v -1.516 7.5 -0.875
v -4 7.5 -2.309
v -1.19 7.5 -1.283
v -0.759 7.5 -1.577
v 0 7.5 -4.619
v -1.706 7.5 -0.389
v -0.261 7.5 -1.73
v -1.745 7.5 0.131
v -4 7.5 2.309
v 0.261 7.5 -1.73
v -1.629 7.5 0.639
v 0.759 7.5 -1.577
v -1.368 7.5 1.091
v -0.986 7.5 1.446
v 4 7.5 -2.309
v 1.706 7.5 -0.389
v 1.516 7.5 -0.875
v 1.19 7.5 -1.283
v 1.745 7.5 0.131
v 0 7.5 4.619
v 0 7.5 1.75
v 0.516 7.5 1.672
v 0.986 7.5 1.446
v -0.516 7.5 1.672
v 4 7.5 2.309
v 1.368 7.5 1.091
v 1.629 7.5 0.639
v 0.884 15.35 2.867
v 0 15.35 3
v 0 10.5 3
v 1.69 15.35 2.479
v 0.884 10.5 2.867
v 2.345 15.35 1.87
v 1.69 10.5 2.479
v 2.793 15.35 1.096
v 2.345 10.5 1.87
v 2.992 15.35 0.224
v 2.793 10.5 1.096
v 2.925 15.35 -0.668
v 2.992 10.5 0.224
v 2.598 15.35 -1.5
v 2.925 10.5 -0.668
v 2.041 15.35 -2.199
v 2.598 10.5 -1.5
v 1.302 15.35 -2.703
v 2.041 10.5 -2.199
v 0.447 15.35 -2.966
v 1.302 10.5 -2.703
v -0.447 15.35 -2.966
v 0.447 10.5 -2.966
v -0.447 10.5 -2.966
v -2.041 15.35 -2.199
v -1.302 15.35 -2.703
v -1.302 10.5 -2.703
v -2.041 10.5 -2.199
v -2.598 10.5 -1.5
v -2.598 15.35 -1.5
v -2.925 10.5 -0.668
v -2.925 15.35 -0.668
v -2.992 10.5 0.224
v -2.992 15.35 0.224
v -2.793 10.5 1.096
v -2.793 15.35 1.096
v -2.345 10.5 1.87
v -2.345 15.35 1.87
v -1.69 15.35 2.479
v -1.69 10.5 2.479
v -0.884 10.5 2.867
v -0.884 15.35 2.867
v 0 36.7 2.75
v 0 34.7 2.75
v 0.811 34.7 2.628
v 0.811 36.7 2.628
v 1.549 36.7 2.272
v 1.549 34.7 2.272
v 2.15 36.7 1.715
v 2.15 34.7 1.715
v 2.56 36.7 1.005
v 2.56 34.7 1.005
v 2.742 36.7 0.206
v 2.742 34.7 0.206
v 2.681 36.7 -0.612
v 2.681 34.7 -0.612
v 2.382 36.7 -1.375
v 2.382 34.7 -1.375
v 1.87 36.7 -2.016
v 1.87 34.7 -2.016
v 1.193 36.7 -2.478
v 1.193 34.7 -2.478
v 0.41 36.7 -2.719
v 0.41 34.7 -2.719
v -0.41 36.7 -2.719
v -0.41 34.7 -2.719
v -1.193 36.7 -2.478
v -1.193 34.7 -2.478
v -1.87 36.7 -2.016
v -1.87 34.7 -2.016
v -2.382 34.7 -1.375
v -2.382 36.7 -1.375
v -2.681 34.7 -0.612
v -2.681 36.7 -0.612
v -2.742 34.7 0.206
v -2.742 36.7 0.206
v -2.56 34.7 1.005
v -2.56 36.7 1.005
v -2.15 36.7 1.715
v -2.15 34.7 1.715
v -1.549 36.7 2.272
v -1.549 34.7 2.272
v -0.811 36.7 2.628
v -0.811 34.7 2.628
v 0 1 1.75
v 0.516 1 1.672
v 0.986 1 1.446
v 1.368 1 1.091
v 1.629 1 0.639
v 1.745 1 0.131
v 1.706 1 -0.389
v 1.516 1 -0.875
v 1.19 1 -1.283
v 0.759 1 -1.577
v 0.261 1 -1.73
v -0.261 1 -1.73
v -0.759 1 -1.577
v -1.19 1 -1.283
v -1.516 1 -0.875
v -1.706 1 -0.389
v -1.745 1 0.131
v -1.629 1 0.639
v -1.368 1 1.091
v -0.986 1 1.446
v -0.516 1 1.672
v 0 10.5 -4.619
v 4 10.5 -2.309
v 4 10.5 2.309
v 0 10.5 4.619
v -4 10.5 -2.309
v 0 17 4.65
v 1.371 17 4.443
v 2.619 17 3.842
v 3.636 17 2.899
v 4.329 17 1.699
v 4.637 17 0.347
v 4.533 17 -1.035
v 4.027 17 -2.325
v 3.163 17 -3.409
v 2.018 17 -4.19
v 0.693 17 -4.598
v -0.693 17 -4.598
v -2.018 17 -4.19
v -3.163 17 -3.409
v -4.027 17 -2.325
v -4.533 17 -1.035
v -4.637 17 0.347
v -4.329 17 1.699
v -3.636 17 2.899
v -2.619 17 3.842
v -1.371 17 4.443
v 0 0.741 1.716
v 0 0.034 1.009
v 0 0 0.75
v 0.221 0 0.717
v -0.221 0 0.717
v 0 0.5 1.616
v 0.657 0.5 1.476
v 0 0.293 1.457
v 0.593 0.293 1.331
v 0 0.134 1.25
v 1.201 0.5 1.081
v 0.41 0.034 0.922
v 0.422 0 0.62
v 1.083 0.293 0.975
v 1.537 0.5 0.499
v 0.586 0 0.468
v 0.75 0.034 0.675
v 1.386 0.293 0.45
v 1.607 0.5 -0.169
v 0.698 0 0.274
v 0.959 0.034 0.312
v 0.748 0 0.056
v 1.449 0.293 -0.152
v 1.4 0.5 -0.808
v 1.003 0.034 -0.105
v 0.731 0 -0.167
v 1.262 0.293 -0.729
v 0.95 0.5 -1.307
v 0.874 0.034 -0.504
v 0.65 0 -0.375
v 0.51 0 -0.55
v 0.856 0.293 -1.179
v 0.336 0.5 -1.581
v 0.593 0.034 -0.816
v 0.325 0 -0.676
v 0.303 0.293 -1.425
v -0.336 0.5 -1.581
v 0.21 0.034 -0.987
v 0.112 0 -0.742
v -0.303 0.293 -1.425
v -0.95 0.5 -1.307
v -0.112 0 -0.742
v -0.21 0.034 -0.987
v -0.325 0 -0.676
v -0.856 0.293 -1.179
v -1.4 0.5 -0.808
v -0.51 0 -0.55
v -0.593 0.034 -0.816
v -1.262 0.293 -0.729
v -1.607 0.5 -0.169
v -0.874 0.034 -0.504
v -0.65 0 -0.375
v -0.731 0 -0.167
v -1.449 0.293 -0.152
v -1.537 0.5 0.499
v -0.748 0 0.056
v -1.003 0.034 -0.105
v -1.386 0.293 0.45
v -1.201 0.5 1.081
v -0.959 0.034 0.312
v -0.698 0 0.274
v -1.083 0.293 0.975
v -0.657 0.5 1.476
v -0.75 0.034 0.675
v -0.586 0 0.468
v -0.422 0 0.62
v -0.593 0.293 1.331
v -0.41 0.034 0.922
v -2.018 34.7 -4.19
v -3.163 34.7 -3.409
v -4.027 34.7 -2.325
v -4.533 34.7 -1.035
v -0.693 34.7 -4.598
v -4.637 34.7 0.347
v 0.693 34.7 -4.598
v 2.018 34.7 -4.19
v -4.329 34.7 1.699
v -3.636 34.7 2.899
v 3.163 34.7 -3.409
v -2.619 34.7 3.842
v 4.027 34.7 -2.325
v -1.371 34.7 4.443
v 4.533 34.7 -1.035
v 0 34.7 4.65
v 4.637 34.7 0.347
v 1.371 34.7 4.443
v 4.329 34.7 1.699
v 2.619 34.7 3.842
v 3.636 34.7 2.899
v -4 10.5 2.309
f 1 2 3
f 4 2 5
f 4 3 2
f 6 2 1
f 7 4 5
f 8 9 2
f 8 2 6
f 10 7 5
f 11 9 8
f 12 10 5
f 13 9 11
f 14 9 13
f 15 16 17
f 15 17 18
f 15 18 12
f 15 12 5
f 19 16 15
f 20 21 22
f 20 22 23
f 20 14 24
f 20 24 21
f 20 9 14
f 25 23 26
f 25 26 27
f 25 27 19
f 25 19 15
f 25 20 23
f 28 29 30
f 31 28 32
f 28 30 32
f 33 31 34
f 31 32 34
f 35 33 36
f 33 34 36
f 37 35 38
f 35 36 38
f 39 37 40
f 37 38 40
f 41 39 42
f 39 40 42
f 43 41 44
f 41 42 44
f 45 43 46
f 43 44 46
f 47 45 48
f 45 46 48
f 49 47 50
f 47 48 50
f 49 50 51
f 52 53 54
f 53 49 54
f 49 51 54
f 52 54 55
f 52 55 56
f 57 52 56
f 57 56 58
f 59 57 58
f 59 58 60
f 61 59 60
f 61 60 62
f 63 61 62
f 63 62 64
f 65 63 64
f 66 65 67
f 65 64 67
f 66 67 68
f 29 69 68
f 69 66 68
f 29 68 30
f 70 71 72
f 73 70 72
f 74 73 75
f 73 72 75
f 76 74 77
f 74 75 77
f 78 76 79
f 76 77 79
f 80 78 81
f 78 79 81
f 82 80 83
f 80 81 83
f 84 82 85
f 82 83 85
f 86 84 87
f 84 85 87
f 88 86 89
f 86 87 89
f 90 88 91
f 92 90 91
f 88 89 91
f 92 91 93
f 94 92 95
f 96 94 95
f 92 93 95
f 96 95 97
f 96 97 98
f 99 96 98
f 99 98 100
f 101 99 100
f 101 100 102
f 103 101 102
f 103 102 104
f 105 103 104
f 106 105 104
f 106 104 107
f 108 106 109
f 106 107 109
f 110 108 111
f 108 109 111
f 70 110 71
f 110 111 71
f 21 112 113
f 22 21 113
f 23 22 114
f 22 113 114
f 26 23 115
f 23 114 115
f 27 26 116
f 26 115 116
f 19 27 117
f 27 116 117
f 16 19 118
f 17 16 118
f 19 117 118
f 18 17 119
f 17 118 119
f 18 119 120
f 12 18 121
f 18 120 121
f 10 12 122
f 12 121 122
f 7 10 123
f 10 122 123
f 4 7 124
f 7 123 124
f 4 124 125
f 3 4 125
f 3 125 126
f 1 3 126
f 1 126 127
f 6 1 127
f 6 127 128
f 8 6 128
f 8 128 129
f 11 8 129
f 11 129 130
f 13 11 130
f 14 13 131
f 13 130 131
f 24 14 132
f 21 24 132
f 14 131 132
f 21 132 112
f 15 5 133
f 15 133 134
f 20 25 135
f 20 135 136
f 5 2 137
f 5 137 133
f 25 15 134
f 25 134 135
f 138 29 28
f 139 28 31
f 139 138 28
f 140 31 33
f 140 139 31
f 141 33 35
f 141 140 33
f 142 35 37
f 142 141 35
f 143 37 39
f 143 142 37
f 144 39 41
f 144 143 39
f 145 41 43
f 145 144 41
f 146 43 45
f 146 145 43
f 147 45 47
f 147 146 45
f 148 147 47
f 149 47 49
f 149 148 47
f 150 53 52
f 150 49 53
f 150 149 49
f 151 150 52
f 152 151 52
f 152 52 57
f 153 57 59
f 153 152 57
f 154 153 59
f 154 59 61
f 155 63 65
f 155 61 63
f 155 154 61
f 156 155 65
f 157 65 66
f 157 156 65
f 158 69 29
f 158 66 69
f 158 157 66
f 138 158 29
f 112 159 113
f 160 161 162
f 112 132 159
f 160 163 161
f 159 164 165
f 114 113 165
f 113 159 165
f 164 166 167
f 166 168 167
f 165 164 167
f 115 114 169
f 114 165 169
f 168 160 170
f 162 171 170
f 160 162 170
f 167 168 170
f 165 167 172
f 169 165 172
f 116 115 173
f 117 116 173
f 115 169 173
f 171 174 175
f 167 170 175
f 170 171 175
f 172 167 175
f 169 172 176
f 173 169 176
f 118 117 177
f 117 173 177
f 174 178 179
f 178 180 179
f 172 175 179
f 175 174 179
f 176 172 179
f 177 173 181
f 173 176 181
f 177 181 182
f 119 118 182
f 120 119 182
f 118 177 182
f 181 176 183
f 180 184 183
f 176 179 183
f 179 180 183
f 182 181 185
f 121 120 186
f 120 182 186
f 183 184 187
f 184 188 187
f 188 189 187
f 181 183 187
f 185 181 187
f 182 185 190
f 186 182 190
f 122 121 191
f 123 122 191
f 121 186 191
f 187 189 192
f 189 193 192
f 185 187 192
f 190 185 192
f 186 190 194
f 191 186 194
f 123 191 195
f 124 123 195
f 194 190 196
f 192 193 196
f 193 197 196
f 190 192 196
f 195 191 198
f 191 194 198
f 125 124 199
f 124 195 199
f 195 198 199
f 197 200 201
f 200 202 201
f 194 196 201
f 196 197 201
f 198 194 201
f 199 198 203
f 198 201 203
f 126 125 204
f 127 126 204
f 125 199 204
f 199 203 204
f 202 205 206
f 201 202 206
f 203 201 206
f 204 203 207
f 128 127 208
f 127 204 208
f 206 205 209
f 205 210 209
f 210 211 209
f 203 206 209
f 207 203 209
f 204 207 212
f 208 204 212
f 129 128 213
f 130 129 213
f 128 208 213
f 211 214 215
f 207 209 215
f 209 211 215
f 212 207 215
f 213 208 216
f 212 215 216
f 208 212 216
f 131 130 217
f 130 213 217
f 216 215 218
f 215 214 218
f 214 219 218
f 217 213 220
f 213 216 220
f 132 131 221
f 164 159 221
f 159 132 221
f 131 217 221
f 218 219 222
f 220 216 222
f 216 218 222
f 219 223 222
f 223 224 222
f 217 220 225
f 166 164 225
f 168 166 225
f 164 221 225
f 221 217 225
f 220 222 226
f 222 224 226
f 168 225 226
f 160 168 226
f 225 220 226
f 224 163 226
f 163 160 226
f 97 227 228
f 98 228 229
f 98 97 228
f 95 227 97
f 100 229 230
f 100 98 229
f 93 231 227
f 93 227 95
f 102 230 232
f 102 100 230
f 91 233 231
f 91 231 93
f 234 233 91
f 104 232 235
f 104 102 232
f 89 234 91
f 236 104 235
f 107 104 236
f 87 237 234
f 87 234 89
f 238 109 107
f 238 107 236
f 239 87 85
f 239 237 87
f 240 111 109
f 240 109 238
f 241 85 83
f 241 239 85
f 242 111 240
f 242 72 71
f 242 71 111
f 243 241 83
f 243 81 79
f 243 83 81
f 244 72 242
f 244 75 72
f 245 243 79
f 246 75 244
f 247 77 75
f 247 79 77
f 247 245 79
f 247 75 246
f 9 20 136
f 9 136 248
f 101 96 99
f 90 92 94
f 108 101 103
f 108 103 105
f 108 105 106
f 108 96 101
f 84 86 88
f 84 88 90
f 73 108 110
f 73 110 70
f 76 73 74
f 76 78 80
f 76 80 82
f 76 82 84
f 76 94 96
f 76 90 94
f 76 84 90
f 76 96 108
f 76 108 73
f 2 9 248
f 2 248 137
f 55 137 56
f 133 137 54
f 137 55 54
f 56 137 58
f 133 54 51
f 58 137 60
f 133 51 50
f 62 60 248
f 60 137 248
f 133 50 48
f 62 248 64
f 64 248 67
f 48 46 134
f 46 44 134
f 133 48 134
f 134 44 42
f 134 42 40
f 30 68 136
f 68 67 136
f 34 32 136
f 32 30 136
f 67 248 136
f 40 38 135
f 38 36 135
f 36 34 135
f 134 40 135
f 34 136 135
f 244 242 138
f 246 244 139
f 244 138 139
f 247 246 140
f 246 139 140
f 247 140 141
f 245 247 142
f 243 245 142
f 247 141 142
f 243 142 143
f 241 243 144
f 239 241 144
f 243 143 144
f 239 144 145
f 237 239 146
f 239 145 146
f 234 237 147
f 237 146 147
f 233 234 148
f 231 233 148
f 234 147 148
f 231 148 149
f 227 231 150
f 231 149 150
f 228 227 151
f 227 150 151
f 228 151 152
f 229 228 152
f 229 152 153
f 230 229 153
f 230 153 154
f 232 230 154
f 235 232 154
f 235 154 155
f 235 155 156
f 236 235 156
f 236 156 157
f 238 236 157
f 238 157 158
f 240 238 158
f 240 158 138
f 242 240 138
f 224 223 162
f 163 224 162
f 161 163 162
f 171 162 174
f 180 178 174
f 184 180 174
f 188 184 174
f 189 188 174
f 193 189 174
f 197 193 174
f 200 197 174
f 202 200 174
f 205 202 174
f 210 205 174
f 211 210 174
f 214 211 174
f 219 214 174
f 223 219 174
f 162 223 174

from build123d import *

# Parameters (mm, degrees)
SKETCH_1_R          = 1.75
EXTRUDE_1_DEPTH     = 7.5
SKETCH_2_R          = 3
EXTRUDE_2_DEPTH     = 7.5
SKETCH_3_R          = 4.65
EXTRUDE_3_DEPTH     = 21.7
FILLET_1_R          = 1
EXTRUDE_4_DEPTH     = 3
CUT_EXTRUDE_START   = -2
SKETCH_5_R          = 4.65
SKETCH_5_R_2        = 2.75
CUT_EXTRUDE_1_DEPTH = 2
CHAMFER_1_SIZE      = 2


with BuildPart() as part:
    # 草图1 → 凸台-拉伸1 (new body)
    with BuildSketch(Plane(origin=(0, 0, 0), x_dir=(1, 0, 0), z_dir=(0, 1, 0))):
        with Locations(Location((0, 0, 0), (0, 0, 270))):
            Circle(SKETCH_1_R)
    extrude(amount=EXTRUDE_1_DEPTH)

    # 草图2 → 凸台-拉伸2 (add)
    with BuildSketch(Plane(origin=(0, 7.5, 0), x_dir=(1, 0, 0), z_dir=(0, 1, 0))):
        with Locations(Location((0, 0, 0), (0, 0, 270))):
            Circle(SKETCH_2_R)
    extrude(amount=EXTRUDE_2_DEPTH)

    # 草图3 → 凸台-拉伸3 (add)
    with BuildSketch(Plane(origin=(0, 15, 0), x_dir=(1, 0, 0), z_dir=(0, 1, 0))):
        with Locations(Location((0, 0, 0), (0, 0, 270))):
            Circle(SKETCH_3_R)
    extrude(amount=EXTRUDE_3_DEPTH)

    # 圆角1
    fillet_1_edges = [part.edges().sort_by_distance(p)[0] for p in [
        (0, 0, -1.75),
    ]]
    fillet(fillet_1_edges, radius=FILLET_1_R)

    # 草图4 → 凸台-拉伸4 (add)
    with BuildSketch(Plane.XZ.offset(-7.5)):
        Polygon((0, 4.618802154), (-4, 2.309401077), (-4, -2.309401077), (0, -4.618802154), (4, -2.309401077), (4, 2.309401077), align=None)
    extrude(amount=-EXTRUDE_4_DEPTH)

    # 草图5 → 切除-拉伸1 (cut)
    with BuildSketch(Plane(origin=(0, 36.7, 0), x_dir=(1, 0, 0), z_dir=(0, 1, 0)).offset(CUT_EXTRUDE_START)):
        with Locations(Location((0, 0, 0), (0, 0, 270))):
            Circle(SKETCH_5_R)
        with Locations(Location((0, 0, 0), (0, 0, 270))):
            Circle(SKETCH_5_R_2, mode=Mode.SUBTRACT)
    extrude(amount=CUT_EXTRUDE_1_DEPTH, mode=Mode.SUBTRACT)

    # 倒角1
    # the kernel refuses this chamfer: 2 mm, written as the material it takes off along each edge
    with BuildSketch(Plane(origin=(0, 15, 0), x_dir=(0, 0, 1), z_dir=(-1, 0, 0))) as chamfer_1_piece_1_section:
        Polygon((4.65 - CHAMFER_1_SIZE, 0), (4.65, CHAMFER_1_SIZE), (4.65, 0), align=None)
    chamfer_1_piece_1 = revolve(axis=Axis((0, 15, 0), (0, 1, 0)), mode=Mode.PRIVATE)
    chamfer_1_piece_1 = chamfer_1_piece_1 - Plane(origin=(0, 16.176636647, 0), x_dir=(0, 0, 1), z_dir=(0, -1, 0)) * Cylinder(3, 19, mode=Mode.PRIVATE)
    add(chamfer_1_piece_1, mode=Mode.SUBTRACT)


solid = part.part
